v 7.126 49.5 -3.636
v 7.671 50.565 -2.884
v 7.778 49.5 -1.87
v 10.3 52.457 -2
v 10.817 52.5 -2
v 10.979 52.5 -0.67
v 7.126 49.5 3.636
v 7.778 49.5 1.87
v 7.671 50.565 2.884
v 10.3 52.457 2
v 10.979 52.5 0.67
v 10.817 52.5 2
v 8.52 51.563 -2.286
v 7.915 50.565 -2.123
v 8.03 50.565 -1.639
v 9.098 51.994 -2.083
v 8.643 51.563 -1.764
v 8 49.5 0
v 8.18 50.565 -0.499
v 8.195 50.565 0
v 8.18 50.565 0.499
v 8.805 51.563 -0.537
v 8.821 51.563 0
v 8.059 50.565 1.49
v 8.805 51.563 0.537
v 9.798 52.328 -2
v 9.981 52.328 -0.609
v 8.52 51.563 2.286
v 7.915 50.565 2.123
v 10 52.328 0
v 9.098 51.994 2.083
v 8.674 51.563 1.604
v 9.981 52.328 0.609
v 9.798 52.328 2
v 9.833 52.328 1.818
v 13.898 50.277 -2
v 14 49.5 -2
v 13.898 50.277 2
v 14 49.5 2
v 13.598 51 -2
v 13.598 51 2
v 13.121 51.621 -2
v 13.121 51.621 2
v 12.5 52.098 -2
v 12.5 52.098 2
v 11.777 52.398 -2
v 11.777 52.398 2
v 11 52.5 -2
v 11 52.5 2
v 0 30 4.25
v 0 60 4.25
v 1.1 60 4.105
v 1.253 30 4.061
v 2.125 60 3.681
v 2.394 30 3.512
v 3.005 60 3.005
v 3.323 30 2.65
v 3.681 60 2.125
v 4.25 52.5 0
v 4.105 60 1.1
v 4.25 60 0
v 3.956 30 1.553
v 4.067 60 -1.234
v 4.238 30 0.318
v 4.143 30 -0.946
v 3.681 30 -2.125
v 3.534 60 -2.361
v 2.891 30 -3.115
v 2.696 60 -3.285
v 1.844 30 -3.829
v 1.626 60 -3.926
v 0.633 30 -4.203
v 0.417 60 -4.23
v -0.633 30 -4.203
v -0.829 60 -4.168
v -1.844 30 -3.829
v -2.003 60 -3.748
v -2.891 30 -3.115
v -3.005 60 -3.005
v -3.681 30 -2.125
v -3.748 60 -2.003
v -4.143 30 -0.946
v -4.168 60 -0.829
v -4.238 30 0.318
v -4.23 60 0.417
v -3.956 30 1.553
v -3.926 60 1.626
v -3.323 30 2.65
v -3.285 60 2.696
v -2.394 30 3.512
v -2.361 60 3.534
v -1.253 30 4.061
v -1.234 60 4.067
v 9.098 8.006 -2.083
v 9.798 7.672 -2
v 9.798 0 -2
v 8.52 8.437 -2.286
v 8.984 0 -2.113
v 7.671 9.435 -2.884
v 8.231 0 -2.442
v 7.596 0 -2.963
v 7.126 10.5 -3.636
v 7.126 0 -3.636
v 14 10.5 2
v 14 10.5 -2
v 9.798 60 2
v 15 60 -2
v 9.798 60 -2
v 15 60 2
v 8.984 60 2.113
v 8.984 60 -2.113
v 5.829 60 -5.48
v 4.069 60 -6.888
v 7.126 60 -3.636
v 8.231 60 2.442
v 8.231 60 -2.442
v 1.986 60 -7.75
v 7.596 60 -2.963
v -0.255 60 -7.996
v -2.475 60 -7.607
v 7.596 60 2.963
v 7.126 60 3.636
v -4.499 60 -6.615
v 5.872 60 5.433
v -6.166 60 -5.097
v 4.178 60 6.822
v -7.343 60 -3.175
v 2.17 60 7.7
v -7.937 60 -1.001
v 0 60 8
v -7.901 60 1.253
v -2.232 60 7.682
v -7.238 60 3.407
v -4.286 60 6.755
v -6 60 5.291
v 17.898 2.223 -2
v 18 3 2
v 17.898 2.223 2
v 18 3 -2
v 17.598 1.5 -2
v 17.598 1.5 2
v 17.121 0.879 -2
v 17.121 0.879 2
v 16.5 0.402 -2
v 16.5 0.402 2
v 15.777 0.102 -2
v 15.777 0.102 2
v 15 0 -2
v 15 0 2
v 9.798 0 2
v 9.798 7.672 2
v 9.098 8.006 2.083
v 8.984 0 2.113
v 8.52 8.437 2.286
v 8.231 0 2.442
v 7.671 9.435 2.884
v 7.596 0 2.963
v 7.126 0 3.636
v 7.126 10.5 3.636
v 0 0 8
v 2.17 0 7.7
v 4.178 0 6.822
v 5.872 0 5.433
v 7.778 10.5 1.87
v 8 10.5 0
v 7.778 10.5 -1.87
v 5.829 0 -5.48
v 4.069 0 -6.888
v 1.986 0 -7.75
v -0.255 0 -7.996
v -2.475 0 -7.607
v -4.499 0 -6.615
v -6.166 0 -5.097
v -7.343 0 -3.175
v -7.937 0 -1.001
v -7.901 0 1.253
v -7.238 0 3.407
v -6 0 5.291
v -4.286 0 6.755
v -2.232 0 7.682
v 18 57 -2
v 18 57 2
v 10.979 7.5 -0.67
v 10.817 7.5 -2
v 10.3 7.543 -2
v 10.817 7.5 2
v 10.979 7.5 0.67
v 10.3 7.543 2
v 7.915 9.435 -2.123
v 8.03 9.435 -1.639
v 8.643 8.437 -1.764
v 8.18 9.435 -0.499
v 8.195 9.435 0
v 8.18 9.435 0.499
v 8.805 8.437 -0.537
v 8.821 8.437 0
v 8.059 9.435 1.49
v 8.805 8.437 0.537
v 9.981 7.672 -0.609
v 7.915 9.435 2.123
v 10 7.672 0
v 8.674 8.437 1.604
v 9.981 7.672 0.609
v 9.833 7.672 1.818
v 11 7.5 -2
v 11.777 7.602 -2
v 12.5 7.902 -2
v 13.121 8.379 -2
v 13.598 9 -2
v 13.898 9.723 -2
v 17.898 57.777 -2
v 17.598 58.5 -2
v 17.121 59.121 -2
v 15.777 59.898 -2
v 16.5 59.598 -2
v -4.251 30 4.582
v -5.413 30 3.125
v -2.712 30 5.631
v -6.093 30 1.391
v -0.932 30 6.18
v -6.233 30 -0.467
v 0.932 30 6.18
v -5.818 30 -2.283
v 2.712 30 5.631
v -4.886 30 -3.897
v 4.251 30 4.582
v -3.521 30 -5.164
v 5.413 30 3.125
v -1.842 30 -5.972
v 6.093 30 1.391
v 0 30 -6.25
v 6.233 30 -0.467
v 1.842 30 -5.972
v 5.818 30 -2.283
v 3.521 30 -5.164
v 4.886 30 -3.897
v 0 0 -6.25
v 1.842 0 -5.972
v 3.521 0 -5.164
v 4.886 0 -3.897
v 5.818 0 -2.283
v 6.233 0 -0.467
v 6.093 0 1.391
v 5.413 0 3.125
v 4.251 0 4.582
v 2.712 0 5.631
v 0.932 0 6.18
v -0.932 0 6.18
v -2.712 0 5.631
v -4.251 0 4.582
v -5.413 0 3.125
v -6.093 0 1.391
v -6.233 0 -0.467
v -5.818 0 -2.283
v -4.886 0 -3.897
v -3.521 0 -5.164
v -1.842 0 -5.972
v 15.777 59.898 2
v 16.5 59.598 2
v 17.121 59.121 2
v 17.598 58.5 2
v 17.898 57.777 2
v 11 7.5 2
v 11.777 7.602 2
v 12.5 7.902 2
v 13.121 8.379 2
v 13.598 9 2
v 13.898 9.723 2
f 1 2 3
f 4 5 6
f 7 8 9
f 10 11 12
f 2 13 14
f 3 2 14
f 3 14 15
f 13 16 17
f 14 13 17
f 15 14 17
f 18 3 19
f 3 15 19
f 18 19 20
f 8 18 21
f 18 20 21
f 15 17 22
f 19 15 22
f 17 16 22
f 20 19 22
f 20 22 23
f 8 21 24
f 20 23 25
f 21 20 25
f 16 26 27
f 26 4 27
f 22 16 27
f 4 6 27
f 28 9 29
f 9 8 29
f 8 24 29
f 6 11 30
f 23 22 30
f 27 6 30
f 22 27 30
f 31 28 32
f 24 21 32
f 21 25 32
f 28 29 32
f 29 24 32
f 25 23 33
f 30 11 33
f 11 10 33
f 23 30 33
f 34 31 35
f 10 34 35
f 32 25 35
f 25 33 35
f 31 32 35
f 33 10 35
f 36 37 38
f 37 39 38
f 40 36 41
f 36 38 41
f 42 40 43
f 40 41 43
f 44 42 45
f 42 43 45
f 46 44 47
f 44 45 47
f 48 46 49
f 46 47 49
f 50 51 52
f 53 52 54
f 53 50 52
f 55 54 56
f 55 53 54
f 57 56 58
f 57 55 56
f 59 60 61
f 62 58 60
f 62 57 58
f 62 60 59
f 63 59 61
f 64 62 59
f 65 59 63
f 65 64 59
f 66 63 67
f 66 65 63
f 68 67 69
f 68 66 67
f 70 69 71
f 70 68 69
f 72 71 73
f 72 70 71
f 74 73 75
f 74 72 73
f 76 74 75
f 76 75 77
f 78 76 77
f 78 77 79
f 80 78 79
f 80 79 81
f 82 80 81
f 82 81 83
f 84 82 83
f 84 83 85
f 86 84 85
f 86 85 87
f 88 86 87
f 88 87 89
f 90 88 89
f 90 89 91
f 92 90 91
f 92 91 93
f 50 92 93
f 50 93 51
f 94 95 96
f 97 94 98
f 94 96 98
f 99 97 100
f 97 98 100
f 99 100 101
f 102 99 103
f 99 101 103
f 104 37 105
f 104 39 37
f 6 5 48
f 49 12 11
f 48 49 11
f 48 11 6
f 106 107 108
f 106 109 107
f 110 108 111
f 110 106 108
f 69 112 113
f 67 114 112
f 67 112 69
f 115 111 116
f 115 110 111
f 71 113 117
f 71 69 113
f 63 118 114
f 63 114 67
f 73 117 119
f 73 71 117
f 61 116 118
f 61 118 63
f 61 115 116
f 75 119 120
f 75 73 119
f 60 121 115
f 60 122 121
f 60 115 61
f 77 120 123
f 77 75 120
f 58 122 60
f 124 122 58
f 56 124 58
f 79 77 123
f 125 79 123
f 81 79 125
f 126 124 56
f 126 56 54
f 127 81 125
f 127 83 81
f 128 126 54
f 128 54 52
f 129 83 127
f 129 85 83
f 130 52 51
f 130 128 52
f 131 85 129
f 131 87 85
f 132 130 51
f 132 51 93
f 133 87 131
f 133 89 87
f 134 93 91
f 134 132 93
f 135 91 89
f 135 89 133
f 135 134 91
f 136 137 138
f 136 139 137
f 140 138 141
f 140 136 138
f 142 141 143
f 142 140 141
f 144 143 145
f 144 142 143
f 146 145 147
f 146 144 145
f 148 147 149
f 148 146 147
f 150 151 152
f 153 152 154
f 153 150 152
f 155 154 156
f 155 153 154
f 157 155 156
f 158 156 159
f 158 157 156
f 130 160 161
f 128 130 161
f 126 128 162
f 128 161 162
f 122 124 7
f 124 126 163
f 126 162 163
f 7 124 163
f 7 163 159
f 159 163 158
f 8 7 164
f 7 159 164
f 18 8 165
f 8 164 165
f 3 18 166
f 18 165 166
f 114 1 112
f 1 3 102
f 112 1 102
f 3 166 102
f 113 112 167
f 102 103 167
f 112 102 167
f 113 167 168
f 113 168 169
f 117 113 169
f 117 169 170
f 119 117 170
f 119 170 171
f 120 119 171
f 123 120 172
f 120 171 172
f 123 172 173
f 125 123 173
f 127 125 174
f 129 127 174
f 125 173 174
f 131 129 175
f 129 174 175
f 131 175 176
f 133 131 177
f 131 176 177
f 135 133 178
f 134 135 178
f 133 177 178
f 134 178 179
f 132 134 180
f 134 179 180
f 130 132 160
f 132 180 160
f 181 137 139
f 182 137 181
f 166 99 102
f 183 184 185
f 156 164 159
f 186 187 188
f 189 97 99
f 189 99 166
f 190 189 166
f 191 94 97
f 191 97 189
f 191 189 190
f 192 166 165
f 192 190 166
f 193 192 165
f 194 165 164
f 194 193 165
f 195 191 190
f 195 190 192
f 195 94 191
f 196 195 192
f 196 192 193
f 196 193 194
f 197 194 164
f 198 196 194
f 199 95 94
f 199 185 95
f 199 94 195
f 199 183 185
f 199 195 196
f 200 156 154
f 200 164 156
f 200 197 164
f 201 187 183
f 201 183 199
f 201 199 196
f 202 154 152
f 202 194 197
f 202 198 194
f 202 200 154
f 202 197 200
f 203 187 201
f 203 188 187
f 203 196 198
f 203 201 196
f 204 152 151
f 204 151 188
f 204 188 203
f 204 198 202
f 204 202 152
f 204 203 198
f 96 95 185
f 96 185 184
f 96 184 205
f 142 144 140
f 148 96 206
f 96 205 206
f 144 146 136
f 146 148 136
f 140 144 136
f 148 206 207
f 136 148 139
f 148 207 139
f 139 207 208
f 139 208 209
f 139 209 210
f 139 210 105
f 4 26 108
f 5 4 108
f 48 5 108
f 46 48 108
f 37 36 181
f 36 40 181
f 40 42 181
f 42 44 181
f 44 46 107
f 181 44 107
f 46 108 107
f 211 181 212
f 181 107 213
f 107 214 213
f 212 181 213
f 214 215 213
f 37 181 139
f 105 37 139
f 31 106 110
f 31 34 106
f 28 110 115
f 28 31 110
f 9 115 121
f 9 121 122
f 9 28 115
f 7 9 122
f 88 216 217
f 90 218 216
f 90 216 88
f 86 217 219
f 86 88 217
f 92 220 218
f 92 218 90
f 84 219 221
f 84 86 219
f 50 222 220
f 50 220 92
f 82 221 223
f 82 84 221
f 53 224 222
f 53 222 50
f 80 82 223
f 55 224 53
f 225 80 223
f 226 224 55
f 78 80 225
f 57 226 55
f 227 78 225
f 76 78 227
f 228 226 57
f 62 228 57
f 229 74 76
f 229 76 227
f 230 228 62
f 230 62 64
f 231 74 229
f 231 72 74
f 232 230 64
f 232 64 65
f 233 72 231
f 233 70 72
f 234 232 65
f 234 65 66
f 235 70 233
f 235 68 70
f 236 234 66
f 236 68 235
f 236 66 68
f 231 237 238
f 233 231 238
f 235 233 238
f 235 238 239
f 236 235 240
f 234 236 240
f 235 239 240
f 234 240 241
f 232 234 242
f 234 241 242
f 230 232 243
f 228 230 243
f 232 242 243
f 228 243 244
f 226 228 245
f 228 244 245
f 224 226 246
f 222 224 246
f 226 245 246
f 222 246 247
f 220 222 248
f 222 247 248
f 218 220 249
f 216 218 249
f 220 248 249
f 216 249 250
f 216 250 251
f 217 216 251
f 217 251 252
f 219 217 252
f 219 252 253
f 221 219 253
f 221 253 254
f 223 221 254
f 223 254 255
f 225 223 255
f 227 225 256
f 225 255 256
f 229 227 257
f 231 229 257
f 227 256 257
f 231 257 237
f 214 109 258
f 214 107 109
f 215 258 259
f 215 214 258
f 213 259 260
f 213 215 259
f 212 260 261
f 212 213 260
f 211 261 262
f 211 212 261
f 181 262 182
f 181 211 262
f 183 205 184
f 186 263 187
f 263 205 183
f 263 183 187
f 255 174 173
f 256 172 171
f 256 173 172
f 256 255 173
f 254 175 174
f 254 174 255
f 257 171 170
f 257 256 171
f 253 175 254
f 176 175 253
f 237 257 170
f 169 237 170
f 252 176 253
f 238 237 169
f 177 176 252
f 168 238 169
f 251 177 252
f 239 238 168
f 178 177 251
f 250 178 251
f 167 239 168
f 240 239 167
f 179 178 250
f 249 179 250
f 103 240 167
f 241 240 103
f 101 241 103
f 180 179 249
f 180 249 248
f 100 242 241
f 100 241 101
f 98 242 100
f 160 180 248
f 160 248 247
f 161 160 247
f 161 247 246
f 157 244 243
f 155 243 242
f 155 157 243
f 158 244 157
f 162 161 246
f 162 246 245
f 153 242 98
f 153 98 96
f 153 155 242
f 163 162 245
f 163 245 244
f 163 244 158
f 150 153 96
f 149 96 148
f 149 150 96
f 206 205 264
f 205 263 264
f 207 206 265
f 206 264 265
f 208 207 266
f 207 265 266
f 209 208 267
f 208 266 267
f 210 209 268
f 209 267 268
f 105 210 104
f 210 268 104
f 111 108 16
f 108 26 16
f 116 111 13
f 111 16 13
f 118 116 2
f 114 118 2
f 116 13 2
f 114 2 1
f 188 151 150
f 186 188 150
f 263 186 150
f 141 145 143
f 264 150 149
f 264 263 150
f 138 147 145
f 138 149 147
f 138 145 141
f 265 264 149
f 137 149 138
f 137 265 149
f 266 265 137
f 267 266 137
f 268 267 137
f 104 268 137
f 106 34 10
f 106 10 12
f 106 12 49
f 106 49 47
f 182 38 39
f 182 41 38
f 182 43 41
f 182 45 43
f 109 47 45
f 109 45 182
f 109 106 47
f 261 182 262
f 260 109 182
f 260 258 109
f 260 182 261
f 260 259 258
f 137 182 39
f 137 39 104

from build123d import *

# Parameters (mm, degrees)
SKETCH1_R           = 8
SKETCH1_R_2         = 4.25
BOSS_EXTRUDE1_DEPTH = 60
BOSS_EXTRUDE2_DEPTH = 2
FILLET1_R           = 3
SKETCH3_R           = 6.25
CUT_EXTRUDE1_DEPTH  = 30


with BuildPart() as part:
    # Sketch1 → Boss-Extrude1 (new body)
    with BuildSketch(Plane(origin=(0, 0, 0), x_dir=(1, 0, 0), z_dir=(0, 1, 0))):
        with Locations(Location((0, 0, 0), (0, 0, 270))):
            Circle(SKETCH1_R)
        with Locations(Location((0, 0, 0), (0, 0, 270))):
            Circle(SKETCH1_R_2, mode=Mode.SUBTRACT)
    extrude(amount=BOSS_EXTRUDE1_DEPTH)

    # Sketch2 → Boss-Extrude2 (add, symmetric)
    with BuildSketch(Plane.XY):
        Polygon((18, 60), (4.25, 60), (4.25, 52.5), (14, 52.5), (14, 7.5), (4.25, 7.5), (4.25, 0), (18, 0), align=None)
    extrude(amount=BOSS_EXTRUDE2_DEPTH, both=True)

    # Fillet1
    fillet1_edges = [part.edges().sort_by_distance(p)[0] for p in [
        (7.745966692, 3.75, -2),
        (7.745966692, 3.75, 2),
        (7.745966692, 56.25, -2),
        (7.745966692, 56.25, 2),
        (18, 0, 0),
        (18, 60, 0),
        (8, 52.5, 0),
        (14, 52.5, 0),
        (8, 7.5, 0),
        (14, 7.5, 0),
    ]]
    fillet(fillet1_edges, radius=FILLET1_R - 0.0001)  # a hair under: the kernel refuses the full size

    # Sketch3 → Cut-Extrude1 (cut)
    with BuildSketch(Plane.XZ):
        with Locations(Location((0, 0, 0), (0, 0, 270))):
            Circle(SKETCH3_R)
    extrude(amount=-CUT_EXTRUDE1_DEPTH, mode=Mode.SUBTRACT)


solid = part.part
